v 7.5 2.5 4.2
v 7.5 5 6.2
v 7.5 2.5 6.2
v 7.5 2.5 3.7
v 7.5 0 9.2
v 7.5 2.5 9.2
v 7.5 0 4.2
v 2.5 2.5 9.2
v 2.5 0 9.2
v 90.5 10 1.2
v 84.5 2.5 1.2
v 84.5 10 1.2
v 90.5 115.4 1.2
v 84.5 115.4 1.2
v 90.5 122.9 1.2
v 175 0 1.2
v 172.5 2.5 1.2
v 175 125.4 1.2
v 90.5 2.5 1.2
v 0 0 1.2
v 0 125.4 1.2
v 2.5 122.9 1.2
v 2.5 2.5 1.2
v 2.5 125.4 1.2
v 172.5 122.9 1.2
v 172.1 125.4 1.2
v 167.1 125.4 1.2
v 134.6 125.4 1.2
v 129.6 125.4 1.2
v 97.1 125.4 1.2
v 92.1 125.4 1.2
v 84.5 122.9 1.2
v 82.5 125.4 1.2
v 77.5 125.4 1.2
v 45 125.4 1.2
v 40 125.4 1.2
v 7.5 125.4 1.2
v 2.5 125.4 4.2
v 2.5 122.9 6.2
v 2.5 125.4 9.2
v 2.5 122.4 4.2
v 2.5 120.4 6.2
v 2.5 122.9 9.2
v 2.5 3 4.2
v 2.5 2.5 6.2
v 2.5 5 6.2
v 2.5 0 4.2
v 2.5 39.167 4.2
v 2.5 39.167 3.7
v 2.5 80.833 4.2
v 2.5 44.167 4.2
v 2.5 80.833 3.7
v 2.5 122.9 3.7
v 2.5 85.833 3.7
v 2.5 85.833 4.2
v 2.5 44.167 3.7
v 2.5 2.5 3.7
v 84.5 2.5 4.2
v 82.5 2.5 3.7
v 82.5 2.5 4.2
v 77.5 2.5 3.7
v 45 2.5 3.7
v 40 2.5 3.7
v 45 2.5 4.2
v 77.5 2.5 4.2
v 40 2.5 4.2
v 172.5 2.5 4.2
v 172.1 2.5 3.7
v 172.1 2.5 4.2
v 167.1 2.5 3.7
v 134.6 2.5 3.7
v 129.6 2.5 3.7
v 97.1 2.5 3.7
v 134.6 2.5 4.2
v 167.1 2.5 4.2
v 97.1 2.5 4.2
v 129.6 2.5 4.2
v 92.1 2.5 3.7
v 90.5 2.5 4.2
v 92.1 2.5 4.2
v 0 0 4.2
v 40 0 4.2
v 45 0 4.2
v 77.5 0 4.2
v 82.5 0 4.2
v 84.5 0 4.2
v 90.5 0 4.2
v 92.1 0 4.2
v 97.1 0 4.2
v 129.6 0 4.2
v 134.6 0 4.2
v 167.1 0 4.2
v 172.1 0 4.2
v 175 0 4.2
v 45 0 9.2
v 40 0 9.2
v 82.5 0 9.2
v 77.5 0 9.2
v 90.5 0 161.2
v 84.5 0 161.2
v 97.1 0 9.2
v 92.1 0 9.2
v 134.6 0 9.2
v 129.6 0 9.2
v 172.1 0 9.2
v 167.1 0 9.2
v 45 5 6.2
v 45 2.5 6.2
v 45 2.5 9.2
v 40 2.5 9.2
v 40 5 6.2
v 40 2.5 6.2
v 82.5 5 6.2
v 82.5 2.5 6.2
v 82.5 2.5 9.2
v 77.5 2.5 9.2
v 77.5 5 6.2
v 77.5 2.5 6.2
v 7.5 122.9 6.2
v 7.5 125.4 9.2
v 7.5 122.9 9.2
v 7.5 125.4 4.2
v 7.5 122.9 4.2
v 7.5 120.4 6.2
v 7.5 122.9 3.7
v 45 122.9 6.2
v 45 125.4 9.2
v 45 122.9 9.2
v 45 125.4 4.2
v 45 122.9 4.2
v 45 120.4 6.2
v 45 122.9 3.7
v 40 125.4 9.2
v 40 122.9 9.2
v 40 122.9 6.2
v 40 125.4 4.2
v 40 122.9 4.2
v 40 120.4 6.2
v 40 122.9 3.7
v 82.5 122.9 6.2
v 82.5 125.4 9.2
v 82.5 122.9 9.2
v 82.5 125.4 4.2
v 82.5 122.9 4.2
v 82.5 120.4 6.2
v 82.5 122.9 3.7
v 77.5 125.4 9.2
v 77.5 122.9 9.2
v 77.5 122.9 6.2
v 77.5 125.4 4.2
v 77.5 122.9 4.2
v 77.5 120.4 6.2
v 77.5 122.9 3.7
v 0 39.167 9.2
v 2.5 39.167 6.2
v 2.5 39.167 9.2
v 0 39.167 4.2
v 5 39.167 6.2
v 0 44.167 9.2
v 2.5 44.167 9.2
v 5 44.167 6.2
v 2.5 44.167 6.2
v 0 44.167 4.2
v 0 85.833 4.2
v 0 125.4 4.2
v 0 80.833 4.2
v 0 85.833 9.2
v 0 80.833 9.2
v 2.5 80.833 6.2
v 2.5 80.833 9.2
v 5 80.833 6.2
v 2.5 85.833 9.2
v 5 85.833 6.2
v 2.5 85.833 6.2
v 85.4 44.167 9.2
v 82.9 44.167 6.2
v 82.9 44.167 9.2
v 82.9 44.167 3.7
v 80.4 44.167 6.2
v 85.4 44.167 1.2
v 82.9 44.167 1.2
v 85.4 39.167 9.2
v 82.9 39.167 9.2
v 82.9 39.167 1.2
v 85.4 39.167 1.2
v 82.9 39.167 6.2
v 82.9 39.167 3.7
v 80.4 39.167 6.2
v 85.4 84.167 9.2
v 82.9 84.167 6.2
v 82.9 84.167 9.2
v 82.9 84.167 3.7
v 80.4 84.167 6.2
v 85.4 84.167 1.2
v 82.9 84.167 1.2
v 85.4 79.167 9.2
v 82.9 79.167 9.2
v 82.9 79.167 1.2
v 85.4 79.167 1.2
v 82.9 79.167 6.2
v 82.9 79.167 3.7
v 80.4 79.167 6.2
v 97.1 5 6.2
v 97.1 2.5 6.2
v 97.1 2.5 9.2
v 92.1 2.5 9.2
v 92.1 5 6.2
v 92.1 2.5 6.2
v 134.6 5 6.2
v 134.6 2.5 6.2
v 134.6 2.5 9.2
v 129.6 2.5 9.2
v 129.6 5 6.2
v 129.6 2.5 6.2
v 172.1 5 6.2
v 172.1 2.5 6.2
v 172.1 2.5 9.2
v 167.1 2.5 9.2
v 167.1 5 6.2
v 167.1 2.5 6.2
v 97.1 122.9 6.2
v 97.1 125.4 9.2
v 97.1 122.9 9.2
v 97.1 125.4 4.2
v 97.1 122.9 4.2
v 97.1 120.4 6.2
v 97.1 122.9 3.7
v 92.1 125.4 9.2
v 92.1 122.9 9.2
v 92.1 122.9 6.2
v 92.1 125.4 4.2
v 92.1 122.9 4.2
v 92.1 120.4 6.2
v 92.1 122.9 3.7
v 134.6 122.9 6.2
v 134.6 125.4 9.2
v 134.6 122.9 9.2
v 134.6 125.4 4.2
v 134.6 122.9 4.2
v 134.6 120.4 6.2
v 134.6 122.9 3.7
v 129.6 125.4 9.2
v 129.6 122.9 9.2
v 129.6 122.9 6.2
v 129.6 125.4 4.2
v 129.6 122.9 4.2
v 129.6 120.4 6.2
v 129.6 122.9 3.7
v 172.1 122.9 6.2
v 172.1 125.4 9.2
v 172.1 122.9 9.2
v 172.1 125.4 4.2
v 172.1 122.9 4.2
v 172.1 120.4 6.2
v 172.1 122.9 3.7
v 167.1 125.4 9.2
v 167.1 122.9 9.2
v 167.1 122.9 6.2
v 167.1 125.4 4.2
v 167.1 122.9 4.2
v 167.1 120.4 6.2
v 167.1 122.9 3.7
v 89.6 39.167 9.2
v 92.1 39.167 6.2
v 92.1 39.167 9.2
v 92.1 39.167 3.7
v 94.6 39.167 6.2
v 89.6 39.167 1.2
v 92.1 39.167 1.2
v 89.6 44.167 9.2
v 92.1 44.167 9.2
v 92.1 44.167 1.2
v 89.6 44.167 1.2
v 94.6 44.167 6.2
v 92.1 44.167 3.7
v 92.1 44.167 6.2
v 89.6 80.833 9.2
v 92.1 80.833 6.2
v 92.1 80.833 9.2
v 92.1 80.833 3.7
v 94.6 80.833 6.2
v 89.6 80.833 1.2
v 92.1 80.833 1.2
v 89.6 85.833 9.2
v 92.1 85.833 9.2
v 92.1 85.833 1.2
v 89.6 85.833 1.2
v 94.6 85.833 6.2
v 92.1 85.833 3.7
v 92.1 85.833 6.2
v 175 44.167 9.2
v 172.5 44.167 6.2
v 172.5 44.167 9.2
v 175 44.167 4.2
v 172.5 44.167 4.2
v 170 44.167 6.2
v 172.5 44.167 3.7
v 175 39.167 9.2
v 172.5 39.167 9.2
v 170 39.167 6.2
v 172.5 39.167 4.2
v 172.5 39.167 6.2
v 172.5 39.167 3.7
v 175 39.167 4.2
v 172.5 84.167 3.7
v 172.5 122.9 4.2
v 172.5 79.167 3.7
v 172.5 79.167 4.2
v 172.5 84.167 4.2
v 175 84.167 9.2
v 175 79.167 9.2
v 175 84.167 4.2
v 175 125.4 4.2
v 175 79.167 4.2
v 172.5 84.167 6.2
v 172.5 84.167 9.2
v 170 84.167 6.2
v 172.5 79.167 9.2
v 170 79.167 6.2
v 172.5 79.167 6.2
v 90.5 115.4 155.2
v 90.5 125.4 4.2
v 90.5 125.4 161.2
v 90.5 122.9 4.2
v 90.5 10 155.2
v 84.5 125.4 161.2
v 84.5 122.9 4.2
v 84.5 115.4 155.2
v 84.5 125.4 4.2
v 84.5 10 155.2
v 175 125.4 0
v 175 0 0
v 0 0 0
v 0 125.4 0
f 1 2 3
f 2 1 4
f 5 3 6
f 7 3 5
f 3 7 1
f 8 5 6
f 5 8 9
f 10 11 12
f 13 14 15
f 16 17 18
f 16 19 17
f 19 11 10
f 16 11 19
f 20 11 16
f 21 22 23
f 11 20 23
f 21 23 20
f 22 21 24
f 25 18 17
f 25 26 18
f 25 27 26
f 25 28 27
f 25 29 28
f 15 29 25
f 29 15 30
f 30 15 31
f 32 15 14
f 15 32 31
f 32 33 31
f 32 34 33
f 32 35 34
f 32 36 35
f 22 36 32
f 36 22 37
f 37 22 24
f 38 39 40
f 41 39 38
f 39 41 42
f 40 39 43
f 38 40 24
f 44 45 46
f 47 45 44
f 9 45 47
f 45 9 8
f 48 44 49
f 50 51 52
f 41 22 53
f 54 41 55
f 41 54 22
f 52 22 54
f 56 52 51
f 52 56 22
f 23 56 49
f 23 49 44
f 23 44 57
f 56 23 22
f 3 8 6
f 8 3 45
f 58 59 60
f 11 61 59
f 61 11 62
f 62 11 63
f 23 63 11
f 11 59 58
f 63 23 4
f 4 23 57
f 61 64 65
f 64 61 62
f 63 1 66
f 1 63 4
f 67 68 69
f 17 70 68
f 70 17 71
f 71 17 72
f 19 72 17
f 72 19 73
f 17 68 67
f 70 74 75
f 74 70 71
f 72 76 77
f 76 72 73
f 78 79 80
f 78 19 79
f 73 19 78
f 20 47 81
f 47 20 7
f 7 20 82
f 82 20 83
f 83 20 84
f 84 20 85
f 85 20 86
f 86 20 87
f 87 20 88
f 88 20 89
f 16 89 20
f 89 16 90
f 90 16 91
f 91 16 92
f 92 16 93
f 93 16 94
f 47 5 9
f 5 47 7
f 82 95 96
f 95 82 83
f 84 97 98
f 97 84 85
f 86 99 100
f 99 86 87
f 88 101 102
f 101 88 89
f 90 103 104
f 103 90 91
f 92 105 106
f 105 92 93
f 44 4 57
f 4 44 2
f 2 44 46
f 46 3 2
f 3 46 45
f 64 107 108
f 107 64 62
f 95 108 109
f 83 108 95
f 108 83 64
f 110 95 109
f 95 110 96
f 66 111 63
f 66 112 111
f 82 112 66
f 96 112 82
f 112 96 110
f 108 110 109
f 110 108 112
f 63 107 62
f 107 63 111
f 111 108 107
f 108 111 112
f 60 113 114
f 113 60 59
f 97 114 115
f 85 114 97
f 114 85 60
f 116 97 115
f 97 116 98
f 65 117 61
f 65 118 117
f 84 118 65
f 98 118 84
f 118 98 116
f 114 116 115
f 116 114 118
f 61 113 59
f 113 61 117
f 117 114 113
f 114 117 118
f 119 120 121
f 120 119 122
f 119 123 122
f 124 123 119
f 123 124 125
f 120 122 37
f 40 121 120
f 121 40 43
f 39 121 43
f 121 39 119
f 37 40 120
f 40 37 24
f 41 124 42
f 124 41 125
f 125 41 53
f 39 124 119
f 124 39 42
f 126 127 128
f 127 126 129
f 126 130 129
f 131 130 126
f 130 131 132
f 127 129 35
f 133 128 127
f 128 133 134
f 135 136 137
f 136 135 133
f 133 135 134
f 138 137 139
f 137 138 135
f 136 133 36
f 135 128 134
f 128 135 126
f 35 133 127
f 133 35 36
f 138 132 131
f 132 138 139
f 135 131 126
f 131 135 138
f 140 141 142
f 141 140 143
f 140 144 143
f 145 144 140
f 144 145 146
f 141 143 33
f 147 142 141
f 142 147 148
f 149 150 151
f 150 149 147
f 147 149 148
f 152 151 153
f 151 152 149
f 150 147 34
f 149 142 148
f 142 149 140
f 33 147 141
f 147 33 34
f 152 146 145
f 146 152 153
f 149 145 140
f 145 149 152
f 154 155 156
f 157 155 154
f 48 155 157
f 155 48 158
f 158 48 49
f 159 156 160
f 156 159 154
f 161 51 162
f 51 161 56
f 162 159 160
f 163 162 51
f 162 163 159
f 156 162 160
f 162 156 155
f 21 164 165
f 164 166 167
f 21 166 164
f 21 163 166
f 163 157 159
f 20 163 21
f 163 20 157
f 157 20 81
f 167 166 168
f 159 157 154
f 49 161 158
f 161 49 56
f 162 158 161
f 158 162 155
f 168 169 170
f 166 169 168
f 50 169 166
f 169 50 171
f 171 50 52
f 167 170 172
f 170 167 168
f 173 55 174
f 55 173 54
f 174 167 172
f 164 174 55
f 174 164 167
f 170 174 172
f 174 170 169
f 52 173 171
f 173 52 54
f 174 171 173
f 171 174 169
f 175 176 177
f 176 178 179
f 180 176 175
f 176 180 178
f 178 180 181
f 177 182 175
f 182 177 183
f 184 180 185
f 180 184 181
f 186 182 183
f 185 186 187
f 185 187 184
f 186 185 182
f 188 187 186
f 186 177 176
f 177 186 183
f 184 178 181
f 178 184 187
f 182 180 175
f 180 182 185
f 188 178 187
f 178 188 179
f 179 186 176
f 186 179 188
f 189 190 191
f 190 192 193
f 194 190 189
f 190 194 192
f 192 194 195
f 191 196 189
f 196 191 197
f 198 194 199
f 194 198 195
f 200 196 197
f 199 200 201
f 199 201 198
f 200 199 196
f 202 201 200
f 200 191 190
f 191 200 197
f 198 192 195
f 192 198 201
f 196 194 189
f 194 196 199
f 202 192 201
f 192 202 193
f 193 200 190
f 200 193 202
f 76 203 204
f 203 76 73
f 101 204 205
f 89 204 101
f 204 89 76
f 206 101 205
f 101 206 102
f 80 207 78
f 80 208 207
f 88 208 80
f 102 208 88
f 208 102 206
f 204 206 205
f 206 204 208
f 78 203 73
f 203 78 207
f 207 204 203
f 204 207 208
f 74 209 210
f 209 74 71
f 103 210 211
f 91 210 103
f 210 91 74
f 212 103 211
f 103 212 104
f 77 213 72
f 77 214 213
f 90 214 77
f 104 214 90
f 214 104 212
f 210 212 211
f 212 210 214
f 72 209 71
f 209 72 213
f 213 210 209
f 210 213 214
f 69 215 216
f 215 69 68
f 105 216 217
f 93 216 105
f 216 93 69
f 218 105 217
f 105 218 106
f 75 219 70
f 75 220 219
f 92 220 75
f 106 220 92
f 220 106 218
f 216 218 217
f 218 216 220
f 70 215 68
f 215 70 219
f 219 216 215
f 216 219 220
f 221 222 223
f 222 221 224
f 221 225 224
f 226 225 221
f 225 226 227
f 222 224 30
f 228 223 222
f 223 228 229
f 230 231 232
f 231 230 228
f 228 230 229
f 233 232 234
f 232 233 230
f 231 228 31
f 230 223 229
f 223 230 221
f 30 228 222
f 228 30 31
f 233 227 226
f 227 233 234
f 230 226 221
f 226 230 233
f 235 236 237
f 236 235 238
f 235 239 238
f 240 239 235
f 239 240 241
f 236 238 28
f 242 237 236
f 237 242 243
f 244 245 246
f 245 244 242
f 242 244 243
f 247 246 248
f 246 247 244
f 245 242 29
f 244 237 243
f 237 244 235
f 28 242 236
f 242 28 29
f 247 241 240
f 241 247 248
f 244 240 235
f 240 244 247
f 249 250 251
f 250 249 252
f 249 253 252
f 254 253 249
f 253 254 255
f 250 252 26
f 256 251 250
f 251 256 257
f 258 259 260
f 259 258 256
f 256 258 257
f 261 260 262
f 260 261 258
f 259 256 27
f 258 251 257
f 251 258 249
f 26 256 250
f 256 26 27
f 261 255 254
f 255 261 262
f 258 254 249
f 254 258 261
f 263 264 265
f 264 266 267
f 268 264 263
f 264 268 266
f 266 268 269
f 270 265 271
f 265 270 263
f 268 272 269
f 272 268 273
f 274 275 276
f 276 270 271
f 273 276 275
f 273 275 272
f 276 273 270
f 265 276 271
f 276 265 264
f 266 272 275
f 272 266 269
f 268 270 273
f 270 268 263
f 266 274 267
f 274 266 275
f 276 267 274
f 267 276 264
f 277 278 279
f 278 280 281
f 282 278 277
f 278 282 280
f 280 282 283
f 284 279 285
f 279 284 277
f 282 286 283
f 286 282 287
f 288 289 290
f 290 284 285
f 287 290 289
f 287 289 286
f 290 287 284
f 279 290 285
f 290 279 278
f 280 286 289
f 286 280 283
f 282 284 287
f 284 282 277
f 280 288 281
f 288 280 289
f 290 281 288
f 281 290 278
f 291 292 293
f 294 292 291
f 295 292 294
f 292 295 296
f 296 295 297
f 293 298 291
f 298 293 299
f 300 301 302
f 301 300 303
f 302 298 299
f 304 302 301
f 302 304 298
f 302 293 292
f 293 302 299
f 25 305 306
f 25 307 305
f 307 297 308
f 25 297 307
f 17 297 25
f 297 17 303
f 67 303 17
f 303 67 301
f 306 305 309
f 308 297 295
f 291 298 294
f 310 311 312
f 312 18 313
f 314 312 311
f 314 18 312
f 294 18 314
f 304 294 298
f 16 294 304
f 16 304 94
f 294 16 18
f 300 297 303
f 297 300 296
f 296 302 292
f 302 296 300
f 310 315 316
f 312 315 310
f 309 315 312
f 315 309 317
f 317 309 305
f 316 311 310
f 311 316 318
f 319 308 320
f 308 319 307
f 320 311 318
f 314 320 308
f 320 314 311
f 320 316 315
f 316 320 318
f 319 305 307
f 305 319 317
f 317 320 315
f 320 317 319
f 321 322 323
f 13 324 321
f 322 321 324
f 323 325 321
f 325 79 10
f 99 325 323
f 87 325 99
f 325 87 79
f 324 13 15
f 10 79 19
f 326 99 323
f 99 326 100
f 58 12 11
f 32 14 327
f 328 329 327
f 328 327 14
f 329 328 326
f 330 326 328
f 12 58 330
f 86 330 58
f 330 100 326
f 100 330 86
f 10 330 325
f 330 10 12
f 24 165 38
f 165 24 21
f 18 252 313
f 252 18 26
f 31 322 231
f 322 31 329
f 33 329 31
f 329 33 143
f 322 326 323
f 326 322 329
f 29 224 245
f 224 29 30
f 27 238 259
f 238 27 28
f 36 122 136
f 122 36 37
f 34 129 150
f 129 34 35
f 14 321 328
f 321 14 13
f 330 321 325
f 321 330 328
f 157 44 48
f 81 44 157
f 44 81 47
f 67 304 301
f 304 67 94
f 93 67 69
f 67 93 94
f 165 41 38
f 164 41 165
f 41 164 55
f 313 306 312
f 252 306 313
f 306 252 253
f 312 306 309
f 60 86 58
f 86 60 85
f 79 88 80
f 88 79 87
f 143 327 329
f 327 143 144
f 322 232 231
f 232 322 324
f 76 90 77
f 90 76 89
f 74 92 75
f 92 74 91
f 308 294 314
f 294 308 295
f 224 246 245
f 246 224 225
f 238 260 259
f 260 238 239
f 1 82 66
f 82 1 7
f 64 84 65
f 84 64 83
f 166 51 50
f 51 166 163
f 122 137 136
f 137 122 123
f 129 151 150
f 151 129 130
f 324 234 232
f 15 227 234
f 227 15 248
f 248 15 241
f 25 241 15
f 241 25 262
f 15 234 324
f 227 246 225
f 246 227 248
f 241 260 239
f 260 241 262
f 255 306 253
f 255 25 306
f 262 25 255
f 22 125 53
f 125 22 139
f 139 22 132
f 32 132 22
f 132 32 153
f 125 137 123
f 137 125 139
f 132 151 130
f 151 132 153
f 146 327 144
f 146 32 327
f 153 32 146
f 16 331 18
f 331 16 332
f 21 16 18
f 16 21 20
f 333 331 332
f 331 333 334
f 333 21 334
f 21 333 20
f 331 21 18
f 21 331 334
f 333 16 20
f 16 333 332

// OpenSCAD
use <MCAD/regular_shapes.scad>

wallThickness = 2.5;
baseThickness = 1.2;
grillTolerance = 0.2;

grillWidth = 80;
grillDepth = 120;
grillHeight = 3;

grillLift = 5;
grillHolderWidth = 5;

bowlHeight = 3;

ragHolderThicknessDepth = 10;
ragHolderThicknessWidth = 6;
ragHolderThicknessHeight = 6;
ragHolderHeight = 160;
ragHolderMargin = 7;

printSupportLength = 20;
printSupportWidth = 0.8;

baseDepth = grillDepth + 2 * wallThickness + 2 * grillTolerance;
baseWidth = 175;
grillMountWidth = grillWidth + 2 * wallThickness + 2 * grillTolerance;

module base() {
    cube([baseWidth, baseDepth, baseThickness]);
    
    grillMount();
    
    translate([baseWidth - grillMountWidth, 0, 0])
    grillMount();
    
    // rag holder
    translate([(baseWidth - ragHolderThicknessWidth) / 2, 0, baseThickness]) {
        cube([ragHolderThicknessWidth, ragHolderThicknessDepth, ragHolderHeight]);
        
        translate([0, baseDepth - ragHolderThicknessDepth, 0])
        cube([ragHolderThicknessWidth, ragHolderThicknessDepth, ragHolderHeight]);
        
        translate([0, ragHolderThicknessDepth, ragHolderHeight - ragHolderThicknessHeight])
        cube([ragHolderThicknessWidth, baseDepth - 2 * ragHolderThicknessDepth, ragHolderThicknessHeight]);
    }
    
    // bowl
    translate([0, 0, baseThickness]) {
        cube([baseWidth, wallThickness, bowlHeight]);
        
        translate([0, baseDepth - wallThickness, 0])
        cube([baseWidth, wallThickness, bowlHeight]);
        
        cube([wallThickness, baseDepth, bowlHeight]);
        
        translate([baseWidth - wallThickness, 0, 0])
        cube([wallThickness, baseDepth, bowlHeight]);
    }
}

module grillMount() {
    translate([wallThickness, 0, baseThickness])
    grillArm();
    
    translate([wallThickness + (grillWidth - grillHolderWidth) / 2, 0, baseThickness])
    grillArm();
    
    translate([wallThickness + grillWidth - grillHolderWidth, 0, baseThickness])
    grillArm();
    
    translate([wallThickness, baseDepth, baseThickness])
    scale([1, -1, 1])
    grillArm();
    
    translate([wallThickness + (grillWidth - grillHolderWidth) / 2, baseDepth, baseThickness])
    scale([1, -1, 1])
    grillArm();
    
    translate([wallThickness + grillWidth - grillHolderWidth, baseDepth, baseThickness])
    scale([1, -1, 1])
    grillArm();
    
    translate([0, wallThickness + (grillDepth + grillHolderWidth) * (1/3), baseThickness])
    rotate([0, 0, -90])
    grillArm();
    
    translate([0, wallThickness + (grillDepth + grillHolderWidth) * (2/3), baseThickness])
    rotate([0, 0, -90])
    grillArm();
    
    translate([grillWidth + 2 * wallThickness + 2 * grillTolerance, wallThickness + (grillDepth - 2 *grillHolderWidth) * (1/3), baseThickness])
    rotate([0, 0, 90])
    grillArm();
    
    translate([grillWidth + 2 * wallThickness + 2 * grillTolerance, wallThickness + (grillDepth - grillHolderWidth) * (2/3), baseThickness])
    rotate([0, 0, 90])
    grillArm();
}

module grillArm() {
    color("red")
    cube([grillHolderWidth, wallThickness, grillLift + grillHeight]);
    
    color("red")
    translate([0, wallThickness, grillLift - wallThickness])
    cushion(grillHolderWidth, wallThickness, wallThickness);
}

module grill() {
    hexGrill(grillWidth, grillDepth, grillHeight, wallThickness, grillDepth / 8);
}

module hexGrill(width, depth, height, thickness, holeSize) {
    linear_extrude(height)
    difference() {
        square([width, depth]);
        intersection() {
            translate([thickness, thickness])
            square([width - 2 * thickness, depth - 2 * thickness]);
            union() {
                holeYSpacing = thickness + holeSize * sqrt(3) / 2;
                holeXSpacing = thickness + 0.75 * holeSize;
                grillGridXSize = ceil(width / holeSize) + 1;
                grillGridYSize = ceil(depth / holeSize) + 1;
                for(y = [for(i = [-grillGridYSize:grillGridYSize]) i * holeYSpacing]) {
                    for(ix = [-grillGridXSize:grillGridXSize]) {
                        x = ix * holeXSpacing;
                        translate([x, y + (ix % 2 == 0 ? holeYSpacing / 2 : 0)])
                        hexagon(holeSize / 2);
                    }
                }
            }
        }
    }
}

module cushion(thickness, height, width) {
    rotate([90, 0, 90])
    linear_extrude(thickness)
    polygon([
        [0, height],
        [0, 0],
        [width, height],
        
    ]);
}

module testAssembly() {
    base();
    
    translate([wallThickness + grillTolerance, wallThickness + grillTolerance, baseThickness + grillLift])
    grill();
    
    translate([baseWidth - grillMountWidth + wallThickness + grillTolerance, wallThickness + grillTolerance, baseThickness + grillLift])
    grill();
}

base();
